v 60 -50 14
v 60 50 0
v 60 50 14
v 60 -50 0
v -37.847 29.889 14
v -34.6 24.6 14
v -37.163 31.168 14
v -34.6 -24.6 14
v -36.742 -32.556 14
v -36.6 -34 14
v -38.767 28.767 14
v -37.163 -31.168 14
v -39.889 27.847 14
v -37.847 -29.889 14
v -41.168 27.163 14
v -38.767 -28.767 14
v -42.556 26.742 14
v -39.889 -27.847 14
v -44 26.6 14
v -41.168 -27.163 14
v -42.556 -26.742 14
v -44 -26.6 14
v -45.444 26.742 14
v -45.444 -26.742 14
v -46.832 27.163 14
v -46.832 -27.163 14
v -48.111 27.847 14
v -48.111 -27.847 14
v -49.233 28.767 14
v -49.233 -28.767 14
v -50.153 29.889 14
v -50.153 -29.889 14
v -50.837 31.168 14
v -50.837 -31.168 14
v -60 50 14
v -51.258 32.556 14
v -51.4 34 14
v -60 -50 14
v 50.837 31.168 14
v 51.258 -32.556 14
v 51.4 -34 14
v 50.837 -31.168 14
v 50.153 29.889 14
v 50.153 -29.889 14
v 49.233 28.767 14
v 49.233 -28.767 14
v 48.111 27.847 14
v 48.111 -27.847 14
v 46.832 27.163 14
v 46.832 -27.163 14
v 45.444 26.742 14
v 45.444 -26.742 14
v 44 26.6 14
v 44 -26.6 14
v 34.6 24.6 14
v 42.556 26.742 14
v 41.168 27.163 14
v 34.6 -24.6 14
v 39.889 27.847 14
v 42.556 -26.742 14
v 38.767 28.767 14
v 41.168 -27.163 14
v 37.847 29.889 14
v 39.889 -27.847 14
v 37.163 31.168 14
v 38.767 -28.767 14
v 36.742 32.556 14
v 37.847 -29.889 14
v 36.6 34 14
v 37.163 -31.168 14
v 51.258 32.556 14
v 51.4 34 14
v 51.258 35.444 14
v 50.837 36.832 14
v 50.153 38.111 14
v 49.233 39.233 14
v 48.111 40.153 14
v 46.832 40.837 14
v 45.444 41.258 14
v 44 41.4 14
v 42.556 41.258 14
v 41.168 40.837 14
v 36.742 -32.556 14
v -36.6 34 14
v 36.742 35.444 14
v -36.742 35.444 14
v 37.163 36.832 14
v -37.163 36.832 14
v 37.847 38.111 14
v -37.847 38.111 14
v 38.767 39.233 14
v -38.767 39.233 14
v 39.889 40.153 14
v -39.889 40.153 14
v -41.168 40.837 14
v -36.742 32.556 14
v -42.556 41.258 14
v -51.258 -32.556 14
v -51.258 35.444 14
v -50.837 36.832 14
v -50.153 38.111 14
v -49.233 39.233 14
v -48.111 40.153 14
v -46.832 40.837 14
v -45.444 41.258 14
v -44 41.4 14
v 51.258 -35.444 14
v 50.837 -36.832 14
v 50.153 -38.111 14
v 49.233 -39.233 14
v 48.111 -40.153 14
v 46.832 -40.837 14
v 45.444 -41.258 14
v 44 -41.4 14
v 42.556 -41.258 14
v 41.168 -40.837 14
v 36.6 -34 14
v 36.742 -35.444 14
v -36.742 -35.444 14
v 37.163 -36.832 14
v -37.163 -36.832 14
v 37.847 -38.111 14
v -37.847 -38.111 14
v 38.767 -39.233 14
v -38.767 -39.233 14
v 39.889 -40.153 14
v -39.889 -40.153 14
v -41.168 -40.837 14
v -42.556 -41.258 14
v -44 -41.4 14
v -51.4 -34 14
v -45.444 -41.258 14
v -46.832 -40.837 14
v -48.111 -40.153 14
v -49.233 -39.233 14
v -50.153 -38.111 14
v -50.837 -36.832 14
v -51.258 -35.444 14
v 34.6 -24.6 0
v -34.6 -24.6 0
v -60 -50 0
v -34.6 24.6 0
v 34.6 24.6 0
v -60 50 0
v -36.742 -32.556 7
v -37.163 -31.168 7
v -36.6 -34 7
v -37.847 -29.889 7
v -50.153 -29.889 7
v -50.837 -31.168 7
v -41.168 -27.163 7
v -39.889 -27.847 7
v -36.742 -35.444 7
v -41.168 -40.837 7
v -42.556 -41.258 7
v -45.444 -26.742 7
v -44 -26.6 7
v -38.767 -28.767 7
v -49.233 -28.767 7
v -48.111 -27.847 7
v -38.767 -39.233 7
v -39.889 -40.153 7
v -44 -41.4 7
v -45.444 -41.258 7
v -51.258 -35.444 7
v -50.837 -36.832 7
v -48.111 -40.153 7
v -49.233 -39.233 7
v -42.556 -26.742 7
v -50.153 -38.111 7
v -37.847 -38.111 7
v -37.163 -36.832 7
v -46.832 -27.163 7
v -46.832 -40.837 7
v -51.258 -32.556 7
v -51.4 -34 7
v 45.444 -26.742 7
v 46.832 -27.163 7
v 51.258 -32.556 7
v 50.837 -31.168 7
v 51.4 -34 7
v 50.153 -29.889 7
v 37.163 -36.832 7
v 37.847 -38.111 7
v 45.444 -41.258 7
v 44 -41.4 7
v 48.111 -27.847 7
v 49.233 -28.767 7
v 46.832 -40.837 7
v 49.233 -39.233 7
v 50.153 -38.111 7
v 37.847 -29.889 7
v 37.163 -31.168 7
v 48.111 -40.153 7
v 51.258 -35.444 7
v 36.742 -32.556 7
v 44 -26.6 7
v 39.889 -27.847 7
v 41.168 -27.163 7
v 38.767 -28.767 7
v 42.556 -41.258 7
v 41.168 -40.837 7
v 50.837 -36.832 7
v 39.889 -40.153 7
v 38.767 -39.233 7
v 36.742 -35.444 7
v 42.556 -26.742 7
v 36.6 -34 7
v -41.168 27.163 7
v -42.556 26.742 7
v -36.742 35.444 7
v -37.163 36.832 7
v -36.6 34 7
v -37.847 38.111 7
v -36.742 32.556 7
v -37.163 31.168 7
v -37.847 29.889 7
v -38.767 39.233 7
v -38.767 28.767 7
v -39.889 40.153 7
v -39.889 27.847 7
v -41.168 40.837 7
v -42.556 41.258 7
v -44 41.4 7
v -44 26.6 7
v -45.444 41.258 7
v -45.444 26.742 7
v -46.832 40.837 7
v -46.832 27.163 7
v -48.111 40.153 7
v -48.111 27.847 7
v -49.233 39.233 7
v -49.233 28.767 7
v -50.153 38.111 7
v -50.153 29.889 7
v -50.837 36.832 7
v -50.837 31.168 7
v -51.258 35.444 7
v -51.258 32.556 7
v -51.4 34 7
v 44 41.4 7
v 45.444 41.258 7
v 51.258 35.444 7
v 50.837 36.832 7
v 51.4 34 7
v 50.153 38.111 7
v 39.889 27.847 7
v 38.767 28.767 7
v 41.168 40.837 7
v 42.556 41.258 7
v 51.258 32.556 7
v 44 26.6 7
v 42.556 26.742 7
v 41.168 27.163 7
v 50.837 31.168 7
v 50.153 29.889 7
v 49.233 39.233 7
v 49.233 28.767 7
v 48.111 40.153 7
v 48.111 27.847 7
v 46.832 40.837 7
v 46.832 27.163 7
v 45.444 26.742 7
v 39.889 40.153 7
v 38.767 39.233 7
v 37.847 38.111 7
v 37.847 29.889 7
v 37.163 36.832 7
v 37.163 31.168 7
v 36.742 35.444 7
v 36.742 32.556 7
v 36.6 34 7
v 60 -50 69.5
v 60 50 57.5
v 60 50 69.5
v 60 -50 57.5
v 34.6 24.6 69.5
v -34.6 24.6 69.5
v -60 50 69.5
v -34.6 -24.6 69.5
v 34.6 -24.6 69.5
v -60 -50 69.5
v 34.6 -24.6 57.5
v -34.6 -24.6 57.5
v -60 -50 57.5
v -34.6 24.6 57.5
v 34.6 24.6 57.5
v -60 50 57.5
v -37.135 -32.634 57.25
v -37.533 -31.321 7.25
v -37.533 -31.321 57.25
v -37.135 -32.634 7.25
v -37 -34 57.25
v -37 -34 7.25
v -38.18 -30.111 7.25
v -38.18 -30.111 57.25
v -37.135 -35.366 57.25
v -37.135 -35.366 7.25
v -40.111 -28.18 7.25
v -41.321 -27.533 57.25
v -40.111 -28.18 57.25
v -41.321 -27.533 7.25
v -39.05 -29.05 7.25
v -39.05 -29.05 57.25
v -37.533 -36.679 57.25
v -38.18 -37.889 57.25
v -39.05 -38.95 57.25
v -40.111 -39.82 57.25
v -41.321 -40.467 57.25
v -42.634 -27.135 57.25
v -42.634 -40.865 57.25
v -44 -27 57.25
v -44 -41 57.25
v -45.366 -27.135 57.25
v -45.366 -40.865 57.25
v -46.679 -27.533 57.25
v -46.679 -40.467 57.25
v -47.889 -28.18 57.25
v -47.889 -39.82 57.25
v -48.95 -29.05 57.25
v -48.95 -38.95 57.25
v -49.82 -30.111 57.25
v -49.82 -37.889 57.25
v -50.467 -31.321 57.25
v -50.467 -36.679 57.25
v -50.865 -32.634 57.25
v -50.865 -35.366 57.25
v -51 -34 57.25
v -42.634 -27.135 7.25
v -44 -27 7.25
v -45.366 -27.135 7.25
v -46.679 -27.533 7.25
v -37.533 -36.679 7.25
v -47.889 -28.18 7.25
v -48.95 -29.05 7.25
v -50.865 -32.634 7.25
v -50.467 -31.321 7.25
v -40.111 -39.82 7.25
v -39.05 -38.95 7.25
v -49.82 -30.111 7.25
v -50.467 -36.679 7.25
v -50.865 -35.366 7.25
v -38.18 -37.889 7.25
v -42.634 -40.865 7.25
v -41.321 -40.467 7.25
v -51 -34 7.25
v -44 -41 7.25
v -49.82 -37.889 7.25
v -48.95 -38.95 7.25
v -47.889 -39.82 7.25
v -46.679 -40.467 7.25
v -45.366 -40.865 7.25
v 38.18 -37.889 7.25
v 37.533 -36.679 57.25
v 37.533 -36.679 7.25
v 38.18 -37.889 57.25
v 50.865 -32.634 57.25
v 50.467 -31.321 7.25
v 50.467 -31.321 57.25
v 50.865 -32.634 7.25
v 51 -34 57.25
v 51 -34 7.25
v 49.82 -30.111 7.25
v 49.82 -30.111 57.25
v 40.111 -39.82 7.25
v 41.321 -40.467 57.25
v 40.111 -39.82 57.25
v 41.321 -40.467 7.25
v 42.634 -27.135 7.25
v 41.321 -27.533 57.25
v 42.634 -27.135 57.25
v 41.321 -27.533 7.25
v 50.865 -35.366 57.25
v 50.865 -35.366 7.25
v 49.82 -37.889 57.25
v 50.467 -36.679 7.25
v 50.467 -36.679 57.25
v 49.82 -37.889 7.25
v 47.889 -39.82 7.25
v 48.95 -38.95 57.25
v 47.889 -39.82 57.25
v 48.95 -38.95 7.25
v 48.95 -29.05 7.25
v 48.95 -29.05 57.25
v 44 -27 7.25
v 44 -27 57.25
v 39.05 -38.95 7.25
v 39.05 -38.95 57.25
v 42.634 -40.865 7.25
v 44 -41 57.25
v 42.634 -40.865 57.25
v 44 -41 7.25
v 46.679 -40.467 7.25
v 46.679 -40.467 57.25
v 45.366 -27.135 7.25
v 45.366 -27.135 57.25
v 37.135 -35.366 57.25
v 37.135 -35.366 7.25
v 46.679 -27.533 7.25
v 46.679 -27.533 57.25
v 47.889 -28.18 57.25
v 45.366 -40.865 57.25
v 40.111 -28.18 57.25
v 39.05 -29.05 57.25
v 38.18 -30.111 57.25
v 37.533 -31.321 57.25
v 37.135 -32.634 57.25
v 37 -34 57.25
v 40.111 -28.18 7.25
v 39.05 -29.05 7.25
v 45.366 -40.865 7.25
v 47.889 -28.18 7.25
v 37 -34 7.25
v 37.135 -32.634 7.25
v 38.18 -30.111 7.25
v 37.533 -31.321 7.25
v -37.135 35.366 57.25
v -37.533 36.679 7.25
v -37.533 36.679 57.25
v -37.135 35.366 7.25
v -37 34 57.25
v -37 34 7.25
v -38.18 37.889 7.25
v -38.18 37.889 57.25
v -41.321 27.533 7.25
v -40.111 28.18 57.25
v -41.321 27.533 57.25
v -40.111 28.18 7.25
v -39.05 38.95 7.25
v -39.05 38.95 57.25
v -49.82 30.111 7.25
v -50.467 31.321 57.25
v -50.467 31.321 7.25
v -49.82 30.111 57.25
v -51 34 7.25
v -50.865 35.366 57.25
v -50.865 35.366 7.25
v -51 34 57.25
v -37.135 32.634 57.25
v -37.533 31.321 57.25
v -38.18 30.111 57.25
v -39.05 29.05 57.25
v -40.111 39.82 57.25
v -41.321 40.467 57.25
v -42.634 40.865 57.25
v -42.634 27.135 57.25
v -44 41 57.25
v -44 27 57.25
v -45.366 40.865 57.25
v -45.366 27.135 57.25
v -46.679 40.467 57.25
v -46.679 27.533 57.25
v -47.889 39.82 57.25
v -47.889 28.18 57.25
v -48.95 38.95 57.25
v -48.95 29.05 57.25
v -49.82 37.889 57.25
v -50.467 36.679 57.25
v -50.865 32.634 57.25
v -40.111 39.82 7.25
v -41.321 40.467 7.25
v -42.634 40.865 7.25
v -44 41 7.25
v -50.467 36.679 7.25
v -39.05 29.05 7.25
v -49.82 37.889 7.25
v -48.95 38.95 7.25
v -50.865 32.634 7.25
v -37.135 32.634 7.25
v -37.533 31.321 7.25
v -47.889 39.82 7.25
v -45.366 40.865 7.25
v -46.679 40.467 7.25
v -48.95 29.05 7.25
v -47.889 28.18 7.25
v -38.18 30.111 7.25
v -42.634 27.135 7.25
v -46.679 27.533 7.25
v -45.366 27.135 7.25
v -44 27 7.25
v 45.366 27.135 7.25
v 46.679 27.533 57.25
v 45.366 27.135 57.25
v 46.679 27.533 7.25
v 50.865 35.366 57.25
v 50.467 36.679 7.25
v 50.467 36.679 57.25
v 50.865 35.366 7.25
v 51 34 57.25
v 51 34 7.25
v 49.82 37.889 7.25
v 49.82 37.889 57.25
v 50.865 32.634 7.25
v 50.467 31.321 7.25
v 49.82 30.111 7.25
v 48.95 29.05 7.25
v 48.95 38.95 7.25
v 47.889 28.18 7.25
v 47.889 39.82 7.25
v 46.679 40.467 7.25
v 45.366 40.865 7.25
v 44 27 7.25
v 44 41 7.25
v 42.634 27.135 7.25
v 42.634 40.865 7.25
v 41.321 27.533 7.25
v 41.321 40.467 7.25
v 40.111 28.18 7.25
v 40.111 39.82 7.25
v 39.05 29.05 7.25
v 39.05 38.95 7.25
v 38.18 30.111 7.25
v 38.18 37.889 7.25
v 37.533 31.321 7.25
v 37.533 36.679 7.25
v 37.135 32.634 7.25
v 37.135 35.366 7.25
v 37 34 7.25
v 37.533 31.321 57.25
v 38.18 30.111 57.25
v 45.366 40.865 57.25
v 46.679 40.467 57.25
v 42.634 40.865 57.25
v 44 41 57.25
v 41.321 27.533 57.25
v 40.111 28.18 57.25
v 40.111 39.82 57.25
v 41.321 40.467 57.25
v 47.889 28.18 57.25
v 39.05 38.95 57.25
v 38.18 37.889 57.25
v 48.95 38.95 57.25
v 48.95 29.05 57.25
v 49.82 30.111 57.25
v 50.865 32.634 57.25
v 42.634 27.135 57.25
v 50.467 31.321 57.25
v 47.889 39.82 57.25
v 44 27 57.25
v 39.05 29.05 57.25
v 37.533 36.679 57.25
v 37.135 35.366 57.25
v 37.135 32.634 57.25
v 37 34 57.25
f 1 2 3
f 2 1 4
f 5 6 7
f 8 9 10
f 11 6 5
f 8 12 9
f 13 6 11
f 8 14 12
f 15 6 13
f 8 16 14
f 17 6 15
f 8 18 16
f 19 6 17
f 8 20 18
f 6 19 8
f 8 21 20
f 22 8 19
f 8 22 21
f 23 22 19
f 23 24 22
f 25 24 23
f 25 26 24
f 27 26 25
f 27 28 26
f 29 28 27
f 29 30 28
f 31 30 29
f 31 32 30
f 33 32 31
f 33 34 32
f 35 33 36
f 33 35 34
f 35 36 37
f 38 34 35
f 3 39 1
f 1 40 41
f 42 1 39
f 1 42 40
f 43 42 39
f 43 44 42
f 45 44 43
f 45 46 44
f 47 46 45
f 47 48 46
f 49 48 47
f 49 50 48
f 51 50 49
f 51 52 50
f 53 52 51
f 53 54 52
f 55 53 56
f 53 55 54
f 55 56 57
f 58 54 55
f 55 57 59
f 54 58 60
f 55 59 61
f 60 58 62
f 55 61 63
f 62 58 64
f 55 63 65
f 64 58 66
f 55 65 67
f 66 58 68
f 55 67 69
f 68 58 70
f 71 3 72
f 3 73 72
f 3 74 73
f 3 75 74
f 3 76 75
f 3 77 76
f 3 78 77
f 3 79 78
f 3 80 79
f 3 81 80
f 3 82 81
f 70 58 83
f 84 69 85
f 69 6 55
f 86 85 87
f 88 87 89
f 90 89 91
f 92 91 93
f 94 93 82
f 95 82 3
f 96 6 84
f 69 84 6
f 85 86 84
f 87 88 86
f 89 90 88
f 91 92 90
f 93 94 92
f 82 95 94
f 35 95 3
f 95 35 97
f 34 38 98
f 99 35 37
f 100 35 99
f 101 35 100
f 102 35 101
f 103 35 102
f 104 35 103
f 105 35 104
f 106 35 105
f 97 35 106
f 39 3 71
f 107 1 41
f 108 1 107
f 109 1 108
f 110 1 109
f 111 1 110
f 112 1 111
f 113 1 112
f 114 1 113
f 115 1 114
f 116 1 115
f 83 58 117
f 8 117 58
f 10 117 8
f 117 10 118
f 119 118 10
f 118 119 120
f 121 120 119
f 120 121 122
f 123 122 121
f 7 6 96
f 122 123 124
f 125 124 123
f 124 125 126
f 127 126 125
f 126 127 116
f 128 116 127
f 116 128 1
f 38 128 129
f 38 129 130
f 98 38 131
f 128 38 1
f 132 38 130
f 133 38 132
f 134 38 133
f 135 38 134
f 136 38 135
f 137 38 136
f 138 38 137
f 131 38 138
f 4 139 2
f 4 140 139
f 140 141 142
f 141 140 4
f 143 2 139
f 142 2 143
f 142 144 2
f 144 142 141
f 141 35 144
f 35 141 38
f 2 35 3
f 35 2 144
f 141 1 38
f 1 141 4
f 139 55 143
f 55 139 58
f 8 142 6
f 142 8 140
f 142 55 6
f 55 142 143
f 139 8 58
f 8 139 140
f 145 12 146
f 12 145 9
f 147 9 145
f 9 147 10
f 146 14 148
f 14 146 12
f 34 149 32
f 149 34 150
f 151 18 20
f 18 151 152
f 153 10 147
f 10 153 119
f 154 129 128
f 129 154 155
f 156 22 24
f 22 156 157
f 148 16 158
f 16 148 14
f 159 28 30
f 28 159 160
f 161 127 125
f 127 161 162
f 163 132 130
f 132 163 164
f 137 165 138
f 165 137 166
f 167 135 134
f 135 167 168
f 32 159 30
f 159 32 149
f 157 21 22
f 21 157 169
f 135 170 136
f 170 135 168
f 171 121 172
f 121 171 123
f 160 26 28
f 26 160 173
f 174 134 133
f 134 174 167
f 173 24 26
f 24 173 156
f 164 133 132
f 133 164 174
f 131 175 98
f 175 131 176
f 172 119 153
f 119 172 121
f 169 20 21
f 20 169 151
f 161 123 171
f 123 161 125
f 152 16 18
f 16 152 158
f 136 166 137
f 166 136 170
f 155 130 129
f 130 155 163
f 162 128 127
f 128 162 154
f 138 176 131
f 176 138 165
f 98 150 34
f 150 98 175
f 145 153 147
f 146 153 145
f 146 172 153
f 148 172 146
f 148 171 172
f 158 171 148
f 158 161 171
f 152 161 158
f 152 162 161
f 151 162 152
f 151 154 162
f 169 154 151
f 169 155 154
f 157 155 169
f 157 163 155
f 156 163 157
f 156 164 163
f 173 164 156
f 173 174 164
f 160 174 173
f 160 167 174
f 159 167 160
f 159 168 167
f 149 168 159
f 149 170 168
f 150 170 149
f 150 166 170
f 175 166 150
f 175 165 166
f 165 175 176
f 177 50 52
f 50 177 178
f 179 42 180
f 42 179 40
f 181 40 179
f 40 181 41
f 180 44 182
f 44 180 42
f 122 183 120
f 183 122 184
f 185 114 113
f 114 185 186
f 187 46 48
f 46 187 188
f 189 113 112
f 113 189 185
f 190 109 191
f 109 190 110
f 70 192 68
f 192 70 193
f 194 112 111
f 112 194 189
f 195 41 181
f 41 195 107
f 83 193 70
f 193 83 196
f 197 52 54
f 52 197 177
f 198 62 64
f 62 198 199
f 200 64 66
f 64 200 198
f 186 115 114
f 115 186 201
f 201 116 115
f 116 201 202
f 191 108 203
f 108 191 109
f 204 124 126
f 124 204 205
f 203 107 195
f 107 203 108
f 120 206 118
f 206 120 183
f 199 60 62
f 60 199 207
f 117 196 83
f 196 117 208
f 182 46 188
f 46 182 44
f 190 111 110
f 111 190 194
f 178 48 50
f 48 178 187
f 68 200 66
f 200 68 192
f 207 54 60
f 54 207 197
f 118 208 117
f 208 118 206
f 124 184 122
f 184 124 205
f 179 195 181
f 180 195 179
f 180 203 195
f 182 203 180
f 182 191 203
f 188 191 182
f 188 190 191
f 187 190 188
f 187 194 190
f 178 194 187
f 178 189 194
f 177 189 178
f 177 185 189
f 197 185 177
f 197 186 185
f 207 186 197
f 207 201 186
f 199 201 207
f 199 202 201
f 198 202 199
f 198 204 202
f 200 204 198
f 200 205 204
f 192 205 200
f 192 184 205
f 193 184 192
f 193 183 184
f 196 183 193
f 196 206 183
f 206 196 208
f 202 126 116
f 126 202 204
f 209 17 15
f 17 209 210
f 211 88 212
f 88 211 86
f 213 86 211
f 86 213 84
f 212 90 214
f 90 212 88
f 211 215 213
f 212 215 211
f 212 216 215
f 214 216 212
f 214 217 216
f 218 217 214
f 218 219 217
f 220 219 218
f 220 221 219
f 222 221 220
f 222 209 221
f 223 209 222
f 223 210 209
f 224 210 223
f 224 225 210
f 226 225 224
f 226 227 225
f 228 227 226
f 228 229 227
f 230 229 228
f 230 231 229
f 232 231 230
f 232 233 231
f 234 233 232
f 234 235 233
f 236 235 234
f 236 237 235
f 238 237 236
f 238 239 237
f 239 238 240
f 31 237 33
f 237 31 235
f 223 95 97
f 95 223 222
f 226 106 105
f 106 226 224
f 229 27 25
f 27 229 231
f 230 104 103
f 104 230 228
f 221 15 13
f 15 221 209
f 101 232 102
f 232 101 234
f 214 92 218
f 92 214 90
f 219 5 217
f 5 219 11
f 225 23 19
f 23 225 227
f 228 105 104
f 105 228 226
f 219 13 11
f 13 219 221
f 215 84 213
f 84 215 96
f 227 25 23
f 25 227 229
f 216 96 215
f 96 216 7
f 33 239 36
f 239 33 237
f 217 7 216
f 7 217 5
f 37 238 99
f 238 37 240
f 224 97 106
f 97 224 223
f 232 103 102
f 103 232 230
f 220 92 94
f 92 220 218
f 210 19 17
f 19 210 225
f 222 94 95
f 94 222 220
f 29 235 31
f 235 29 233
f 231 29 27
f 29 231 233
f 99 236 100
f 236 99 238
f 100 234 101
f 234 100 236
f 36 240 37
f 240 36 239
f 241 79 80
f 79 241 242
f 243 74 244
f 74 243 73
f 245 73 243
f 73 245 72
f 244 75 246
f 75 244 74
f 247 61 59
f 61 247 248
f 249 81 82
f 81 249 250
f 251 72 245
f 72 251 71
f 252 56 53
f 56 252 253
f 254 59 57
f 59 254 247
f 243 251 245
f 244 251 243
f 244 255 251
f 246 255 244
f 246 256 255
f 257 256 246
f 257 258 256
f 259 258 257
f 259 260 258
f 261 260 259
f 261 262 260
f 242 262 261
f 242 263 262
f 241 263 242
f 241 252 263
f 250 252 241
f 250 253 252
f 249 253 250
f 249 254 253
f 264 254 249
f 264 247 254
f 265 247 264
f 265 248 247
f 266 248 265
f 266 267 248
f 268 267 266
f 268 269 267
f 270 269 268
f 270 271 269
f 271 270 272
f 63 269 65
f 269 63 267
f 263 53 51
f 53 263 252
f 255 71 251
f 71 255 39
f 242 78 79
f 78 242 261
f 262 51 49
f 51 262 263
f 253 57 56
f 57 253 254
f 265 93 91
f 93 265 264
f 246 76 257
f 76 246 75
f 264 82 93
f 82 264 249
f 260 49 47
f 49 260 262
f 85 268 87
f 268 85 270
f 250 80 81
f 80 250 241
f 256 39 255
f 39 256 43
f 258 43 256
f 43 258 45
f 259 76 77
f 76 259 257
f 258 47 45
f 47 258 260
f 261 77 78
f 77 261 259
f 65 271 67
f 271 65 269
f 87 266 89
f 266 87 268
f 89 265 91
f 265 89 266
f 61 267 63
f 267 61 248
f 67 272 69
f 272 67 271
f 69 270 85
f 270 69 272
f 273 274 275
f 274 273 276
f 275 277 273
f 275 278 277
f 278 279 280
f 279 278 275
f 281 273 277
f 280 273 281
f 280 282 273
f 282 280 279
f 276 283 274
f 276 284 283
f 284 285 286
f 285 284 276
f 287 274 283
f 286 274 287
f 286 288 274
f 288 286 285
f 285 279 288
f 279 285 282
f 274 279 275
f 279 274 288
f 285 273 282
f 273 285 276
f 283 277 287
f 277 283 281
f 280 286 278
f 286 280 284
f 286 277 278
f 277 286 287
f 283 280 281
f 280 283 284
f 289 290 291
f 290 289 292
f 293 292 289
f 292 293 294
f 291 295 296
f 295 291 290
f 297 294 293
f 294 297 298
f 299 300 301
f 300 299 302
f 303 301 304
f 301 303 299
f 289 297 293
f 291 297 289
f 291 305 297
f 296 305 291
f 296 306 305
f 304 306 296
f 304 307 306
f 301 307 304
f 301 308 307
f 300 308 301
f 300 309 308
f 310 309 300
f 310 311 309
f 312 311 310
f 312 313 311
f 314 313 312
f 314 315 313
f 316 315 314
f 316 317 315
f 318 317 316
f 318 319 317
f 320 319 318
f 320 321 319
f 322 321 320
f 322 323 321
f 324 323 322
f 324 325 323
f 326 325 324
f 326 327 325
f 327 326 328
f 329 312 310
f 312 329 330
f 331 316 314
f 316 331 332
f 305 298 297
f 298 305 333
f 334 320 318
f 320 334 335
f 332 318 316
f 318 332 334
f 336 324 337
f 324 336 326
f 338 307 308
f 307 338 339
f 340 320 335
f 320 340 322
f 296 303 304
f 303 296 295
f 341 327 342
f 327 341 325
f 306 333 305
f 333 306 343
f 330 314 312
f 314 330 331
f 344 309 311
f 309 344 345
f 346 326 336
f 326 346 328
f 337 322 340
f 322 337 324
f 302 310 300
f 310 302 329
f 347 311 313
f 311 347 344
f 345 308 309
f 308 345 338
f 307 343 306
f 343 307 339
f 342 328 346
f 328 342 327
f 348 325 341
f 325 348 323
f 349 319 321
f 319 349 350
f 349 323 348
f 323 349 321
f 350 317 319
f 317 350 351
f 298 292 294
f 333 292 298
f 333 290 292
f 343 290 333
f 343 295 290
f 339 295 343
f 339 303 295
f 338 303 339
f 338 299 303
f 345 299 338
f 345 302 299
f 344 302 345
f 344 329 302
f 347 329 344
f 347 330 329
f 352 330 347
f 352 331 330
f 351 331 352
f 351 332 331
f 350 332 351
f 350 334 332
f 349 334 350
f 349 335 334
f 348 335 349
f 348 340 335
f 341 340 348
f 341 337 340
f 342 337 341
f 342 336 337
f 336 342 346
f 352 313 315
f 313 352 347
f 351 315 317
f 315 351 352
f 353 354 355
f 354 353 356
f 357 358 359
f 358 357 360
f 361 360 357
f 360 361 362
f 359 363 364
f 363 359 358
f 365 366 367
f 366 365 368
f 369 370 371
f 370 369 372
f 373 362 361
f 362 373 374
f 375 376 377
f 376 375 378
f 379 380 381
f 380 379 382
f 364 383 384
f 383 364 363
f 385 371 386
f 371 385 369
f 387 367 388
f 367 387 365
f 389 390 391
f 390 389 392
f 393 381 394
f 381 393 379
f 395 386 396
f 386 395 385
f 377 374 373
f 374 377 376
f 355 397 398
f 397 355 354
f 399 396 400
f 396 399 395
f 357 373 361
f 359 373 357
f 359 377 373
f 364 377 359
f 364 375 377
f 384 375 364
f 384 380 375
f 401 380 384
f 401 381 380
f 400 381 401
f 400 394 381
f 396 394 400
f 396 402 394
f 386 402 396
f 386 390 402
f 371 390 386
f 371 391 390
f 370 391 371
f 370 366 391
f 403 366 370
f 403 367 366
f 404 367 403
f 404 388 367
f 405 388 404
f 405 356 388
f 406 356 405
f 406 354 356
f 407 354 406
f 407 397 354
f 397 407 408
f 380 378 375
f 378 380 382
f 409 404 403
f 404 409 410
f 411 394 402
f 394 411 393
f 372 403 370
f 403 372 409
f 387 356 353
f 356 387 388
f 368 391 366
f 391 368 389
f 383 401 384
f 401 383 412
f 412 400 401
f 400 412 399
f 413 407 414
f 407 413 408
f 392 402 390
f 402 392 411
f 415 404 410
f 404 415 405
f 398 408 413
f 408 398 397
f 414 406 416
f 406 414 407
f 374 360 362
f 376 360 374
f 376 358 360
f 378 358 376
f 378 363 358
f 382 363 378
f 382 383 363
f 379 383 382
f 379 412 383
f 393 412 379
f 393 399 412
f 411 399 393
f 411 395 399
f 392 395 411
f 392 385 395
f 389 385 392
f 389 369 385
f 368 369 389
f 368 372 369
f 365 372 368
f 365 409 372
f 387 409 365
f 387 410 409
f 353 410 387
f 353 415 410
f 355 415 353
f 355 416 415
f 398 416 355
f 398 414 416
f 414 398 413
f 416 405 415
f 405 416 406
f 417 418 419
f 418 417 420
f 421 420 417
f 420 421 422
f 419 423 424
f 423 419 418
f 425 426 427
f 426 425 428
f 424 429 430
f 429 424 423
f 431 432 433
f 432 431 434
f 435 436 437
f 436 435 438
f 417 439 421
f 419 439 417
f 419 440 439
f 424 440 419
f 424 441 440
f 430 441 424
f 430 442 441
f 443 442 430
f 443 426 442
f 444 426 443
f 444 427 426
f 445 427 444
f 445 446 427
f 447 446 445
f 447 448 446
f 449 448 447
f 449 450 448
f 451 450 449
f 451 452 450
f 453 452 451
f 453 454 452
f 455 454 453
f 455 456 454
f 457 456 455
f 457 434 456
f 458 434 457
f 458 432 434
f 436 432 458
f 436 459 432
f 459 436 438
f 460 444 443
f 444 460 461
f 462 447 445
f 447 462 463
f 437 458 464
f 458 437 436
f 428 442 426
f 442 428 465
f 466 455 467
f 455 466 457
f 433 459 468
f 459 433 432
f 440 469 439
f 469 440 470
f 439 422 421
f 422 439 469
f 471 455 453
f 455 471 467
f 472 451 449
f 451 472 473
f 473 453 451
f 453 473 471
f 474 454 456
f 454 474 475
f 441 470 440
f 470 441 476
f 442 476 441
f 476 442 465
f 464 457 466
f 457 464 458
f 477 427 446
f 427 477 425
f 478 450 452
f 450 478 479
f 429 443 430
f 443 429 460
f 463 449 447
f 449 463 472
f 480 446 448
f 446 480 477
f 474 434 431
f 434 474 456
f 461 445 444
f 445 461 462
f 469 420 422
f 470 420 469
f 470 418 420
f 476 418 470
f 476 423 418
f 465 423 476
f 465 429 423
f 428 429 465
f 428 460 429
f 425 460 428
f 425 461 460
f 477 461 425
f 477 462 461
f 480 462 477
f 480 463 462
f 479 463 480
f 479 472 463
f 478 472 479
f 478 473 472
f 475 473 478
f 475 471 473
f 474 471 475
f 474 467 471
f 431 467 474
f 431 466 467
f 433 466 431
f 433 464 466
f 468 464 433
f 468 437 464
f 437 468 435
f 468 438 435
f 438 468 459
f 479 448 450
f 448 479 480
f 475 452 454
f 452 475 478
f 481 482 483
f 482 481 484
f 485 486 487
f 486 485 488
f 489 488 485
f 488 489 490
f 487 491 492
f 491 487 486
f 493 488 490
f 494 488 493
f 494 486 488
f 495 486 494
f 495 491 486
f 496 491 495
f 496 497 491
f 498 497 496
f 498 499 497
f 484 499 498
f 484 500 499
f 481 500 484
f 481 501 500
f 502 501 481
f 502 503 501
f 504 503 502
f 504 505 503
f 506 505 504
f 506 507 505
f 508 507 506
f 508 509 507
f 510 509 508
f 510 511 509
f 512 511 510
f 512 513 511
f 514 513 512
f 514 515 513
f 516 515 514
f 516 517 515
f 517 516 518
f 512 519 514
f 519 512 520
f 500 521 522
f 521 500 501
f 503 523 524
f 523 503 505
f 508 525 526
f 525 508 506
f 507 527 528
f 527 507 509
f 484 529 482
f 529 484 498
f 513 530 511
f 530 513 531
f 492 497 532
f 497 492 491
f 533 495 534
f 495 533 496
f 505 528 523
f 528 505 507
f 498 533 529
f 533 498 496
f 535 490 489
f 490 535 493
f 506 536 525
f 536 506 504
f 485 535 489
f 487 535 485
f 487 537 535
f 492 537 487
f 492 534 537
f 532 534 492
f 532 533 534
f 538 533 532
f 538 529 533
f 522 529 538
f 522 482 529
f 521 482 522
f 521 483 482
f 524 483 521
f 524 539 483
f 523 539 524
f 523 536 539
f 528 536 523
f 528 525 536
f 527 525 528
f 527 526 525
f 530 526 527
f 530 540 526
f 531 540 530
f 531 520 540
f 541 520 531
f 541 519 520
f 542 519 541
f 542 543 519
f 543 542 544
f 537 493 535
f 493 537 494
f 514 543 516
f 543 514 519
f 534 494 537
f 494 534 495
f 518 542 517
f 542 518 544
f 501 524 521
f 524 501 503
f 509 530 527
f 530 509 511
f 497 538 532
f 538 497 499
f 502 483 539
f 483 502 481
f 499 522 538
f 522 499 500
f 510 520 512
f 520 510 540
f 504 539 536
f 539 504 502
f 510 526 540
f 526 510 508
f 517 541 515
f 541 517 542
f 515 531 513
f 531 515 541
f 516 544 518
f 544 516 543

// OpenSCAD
$fn = 32;

// ------------------------------------------------------------------------
// Frame cube: base 120 x 100 mm, posts 50 mm tall
// Every part is its own module, assembly() places every instance.
// ------------------------------------------------------------------------

// --- part 1 ---
module base_frame() {
  difference() {
    translate([-60, -50, 0]) cube([120, 100, 14]);
    translate([-34.6, -24.6, -1]) cube([69.2, 49.2, 16]);
    translate([-44, -34, 7]) cylinder(h = 8, d = 14.8);
    translate([44, -34, 7]) cylinder(h = 8, d = 14.8);
    translate([-44, 34, 7]) cylinder(h = 8, d = 14.8);
    translate([44, 34, 7]) cylinder(h = 8, d = 14.8);
  }
}

// --- part 2 ---
module corner_post() {
  cylinder(h = 50, d = 14);
}

// --- part 3 ---
module top_frame() {
  difference() {
    translate([-60, -50, 0]) cube([120, 100, 12]);
    translate([-34.6, -24.6, -1]) cube([69.2, 49.2, 14]);
  }
}

// --- assembly ---
module assembly() {
  color([0.80, 0.24, 0.20]) translate([0, 0, 0]) rotate([0, 0, 0]) base_frame();
  color([0.20, 0.45, 0.75]) translate([-44, -34, 7.25]) rotate([0, 0, 0]) corner_post();
  color([0.25, 0.62, 0.32]) translate([44, -34, 7.25]) rotate([0, 0, 0]) corner_post();
  color([0.92, 0.70, 0.18]) translate([-44, 34, 7.25]) rotate([0, 0, 0]) corner_post();
  color([0.58, 0.35, 0.70]) translate([44, 34, 7.25]) rotate([0, 0, 0]) corner_post();
  color([0.16, 0.66, 0.66]) translate([0, 0, 57.5]) rotate([0, 0, 0]) top_frame();
}

assembly();
